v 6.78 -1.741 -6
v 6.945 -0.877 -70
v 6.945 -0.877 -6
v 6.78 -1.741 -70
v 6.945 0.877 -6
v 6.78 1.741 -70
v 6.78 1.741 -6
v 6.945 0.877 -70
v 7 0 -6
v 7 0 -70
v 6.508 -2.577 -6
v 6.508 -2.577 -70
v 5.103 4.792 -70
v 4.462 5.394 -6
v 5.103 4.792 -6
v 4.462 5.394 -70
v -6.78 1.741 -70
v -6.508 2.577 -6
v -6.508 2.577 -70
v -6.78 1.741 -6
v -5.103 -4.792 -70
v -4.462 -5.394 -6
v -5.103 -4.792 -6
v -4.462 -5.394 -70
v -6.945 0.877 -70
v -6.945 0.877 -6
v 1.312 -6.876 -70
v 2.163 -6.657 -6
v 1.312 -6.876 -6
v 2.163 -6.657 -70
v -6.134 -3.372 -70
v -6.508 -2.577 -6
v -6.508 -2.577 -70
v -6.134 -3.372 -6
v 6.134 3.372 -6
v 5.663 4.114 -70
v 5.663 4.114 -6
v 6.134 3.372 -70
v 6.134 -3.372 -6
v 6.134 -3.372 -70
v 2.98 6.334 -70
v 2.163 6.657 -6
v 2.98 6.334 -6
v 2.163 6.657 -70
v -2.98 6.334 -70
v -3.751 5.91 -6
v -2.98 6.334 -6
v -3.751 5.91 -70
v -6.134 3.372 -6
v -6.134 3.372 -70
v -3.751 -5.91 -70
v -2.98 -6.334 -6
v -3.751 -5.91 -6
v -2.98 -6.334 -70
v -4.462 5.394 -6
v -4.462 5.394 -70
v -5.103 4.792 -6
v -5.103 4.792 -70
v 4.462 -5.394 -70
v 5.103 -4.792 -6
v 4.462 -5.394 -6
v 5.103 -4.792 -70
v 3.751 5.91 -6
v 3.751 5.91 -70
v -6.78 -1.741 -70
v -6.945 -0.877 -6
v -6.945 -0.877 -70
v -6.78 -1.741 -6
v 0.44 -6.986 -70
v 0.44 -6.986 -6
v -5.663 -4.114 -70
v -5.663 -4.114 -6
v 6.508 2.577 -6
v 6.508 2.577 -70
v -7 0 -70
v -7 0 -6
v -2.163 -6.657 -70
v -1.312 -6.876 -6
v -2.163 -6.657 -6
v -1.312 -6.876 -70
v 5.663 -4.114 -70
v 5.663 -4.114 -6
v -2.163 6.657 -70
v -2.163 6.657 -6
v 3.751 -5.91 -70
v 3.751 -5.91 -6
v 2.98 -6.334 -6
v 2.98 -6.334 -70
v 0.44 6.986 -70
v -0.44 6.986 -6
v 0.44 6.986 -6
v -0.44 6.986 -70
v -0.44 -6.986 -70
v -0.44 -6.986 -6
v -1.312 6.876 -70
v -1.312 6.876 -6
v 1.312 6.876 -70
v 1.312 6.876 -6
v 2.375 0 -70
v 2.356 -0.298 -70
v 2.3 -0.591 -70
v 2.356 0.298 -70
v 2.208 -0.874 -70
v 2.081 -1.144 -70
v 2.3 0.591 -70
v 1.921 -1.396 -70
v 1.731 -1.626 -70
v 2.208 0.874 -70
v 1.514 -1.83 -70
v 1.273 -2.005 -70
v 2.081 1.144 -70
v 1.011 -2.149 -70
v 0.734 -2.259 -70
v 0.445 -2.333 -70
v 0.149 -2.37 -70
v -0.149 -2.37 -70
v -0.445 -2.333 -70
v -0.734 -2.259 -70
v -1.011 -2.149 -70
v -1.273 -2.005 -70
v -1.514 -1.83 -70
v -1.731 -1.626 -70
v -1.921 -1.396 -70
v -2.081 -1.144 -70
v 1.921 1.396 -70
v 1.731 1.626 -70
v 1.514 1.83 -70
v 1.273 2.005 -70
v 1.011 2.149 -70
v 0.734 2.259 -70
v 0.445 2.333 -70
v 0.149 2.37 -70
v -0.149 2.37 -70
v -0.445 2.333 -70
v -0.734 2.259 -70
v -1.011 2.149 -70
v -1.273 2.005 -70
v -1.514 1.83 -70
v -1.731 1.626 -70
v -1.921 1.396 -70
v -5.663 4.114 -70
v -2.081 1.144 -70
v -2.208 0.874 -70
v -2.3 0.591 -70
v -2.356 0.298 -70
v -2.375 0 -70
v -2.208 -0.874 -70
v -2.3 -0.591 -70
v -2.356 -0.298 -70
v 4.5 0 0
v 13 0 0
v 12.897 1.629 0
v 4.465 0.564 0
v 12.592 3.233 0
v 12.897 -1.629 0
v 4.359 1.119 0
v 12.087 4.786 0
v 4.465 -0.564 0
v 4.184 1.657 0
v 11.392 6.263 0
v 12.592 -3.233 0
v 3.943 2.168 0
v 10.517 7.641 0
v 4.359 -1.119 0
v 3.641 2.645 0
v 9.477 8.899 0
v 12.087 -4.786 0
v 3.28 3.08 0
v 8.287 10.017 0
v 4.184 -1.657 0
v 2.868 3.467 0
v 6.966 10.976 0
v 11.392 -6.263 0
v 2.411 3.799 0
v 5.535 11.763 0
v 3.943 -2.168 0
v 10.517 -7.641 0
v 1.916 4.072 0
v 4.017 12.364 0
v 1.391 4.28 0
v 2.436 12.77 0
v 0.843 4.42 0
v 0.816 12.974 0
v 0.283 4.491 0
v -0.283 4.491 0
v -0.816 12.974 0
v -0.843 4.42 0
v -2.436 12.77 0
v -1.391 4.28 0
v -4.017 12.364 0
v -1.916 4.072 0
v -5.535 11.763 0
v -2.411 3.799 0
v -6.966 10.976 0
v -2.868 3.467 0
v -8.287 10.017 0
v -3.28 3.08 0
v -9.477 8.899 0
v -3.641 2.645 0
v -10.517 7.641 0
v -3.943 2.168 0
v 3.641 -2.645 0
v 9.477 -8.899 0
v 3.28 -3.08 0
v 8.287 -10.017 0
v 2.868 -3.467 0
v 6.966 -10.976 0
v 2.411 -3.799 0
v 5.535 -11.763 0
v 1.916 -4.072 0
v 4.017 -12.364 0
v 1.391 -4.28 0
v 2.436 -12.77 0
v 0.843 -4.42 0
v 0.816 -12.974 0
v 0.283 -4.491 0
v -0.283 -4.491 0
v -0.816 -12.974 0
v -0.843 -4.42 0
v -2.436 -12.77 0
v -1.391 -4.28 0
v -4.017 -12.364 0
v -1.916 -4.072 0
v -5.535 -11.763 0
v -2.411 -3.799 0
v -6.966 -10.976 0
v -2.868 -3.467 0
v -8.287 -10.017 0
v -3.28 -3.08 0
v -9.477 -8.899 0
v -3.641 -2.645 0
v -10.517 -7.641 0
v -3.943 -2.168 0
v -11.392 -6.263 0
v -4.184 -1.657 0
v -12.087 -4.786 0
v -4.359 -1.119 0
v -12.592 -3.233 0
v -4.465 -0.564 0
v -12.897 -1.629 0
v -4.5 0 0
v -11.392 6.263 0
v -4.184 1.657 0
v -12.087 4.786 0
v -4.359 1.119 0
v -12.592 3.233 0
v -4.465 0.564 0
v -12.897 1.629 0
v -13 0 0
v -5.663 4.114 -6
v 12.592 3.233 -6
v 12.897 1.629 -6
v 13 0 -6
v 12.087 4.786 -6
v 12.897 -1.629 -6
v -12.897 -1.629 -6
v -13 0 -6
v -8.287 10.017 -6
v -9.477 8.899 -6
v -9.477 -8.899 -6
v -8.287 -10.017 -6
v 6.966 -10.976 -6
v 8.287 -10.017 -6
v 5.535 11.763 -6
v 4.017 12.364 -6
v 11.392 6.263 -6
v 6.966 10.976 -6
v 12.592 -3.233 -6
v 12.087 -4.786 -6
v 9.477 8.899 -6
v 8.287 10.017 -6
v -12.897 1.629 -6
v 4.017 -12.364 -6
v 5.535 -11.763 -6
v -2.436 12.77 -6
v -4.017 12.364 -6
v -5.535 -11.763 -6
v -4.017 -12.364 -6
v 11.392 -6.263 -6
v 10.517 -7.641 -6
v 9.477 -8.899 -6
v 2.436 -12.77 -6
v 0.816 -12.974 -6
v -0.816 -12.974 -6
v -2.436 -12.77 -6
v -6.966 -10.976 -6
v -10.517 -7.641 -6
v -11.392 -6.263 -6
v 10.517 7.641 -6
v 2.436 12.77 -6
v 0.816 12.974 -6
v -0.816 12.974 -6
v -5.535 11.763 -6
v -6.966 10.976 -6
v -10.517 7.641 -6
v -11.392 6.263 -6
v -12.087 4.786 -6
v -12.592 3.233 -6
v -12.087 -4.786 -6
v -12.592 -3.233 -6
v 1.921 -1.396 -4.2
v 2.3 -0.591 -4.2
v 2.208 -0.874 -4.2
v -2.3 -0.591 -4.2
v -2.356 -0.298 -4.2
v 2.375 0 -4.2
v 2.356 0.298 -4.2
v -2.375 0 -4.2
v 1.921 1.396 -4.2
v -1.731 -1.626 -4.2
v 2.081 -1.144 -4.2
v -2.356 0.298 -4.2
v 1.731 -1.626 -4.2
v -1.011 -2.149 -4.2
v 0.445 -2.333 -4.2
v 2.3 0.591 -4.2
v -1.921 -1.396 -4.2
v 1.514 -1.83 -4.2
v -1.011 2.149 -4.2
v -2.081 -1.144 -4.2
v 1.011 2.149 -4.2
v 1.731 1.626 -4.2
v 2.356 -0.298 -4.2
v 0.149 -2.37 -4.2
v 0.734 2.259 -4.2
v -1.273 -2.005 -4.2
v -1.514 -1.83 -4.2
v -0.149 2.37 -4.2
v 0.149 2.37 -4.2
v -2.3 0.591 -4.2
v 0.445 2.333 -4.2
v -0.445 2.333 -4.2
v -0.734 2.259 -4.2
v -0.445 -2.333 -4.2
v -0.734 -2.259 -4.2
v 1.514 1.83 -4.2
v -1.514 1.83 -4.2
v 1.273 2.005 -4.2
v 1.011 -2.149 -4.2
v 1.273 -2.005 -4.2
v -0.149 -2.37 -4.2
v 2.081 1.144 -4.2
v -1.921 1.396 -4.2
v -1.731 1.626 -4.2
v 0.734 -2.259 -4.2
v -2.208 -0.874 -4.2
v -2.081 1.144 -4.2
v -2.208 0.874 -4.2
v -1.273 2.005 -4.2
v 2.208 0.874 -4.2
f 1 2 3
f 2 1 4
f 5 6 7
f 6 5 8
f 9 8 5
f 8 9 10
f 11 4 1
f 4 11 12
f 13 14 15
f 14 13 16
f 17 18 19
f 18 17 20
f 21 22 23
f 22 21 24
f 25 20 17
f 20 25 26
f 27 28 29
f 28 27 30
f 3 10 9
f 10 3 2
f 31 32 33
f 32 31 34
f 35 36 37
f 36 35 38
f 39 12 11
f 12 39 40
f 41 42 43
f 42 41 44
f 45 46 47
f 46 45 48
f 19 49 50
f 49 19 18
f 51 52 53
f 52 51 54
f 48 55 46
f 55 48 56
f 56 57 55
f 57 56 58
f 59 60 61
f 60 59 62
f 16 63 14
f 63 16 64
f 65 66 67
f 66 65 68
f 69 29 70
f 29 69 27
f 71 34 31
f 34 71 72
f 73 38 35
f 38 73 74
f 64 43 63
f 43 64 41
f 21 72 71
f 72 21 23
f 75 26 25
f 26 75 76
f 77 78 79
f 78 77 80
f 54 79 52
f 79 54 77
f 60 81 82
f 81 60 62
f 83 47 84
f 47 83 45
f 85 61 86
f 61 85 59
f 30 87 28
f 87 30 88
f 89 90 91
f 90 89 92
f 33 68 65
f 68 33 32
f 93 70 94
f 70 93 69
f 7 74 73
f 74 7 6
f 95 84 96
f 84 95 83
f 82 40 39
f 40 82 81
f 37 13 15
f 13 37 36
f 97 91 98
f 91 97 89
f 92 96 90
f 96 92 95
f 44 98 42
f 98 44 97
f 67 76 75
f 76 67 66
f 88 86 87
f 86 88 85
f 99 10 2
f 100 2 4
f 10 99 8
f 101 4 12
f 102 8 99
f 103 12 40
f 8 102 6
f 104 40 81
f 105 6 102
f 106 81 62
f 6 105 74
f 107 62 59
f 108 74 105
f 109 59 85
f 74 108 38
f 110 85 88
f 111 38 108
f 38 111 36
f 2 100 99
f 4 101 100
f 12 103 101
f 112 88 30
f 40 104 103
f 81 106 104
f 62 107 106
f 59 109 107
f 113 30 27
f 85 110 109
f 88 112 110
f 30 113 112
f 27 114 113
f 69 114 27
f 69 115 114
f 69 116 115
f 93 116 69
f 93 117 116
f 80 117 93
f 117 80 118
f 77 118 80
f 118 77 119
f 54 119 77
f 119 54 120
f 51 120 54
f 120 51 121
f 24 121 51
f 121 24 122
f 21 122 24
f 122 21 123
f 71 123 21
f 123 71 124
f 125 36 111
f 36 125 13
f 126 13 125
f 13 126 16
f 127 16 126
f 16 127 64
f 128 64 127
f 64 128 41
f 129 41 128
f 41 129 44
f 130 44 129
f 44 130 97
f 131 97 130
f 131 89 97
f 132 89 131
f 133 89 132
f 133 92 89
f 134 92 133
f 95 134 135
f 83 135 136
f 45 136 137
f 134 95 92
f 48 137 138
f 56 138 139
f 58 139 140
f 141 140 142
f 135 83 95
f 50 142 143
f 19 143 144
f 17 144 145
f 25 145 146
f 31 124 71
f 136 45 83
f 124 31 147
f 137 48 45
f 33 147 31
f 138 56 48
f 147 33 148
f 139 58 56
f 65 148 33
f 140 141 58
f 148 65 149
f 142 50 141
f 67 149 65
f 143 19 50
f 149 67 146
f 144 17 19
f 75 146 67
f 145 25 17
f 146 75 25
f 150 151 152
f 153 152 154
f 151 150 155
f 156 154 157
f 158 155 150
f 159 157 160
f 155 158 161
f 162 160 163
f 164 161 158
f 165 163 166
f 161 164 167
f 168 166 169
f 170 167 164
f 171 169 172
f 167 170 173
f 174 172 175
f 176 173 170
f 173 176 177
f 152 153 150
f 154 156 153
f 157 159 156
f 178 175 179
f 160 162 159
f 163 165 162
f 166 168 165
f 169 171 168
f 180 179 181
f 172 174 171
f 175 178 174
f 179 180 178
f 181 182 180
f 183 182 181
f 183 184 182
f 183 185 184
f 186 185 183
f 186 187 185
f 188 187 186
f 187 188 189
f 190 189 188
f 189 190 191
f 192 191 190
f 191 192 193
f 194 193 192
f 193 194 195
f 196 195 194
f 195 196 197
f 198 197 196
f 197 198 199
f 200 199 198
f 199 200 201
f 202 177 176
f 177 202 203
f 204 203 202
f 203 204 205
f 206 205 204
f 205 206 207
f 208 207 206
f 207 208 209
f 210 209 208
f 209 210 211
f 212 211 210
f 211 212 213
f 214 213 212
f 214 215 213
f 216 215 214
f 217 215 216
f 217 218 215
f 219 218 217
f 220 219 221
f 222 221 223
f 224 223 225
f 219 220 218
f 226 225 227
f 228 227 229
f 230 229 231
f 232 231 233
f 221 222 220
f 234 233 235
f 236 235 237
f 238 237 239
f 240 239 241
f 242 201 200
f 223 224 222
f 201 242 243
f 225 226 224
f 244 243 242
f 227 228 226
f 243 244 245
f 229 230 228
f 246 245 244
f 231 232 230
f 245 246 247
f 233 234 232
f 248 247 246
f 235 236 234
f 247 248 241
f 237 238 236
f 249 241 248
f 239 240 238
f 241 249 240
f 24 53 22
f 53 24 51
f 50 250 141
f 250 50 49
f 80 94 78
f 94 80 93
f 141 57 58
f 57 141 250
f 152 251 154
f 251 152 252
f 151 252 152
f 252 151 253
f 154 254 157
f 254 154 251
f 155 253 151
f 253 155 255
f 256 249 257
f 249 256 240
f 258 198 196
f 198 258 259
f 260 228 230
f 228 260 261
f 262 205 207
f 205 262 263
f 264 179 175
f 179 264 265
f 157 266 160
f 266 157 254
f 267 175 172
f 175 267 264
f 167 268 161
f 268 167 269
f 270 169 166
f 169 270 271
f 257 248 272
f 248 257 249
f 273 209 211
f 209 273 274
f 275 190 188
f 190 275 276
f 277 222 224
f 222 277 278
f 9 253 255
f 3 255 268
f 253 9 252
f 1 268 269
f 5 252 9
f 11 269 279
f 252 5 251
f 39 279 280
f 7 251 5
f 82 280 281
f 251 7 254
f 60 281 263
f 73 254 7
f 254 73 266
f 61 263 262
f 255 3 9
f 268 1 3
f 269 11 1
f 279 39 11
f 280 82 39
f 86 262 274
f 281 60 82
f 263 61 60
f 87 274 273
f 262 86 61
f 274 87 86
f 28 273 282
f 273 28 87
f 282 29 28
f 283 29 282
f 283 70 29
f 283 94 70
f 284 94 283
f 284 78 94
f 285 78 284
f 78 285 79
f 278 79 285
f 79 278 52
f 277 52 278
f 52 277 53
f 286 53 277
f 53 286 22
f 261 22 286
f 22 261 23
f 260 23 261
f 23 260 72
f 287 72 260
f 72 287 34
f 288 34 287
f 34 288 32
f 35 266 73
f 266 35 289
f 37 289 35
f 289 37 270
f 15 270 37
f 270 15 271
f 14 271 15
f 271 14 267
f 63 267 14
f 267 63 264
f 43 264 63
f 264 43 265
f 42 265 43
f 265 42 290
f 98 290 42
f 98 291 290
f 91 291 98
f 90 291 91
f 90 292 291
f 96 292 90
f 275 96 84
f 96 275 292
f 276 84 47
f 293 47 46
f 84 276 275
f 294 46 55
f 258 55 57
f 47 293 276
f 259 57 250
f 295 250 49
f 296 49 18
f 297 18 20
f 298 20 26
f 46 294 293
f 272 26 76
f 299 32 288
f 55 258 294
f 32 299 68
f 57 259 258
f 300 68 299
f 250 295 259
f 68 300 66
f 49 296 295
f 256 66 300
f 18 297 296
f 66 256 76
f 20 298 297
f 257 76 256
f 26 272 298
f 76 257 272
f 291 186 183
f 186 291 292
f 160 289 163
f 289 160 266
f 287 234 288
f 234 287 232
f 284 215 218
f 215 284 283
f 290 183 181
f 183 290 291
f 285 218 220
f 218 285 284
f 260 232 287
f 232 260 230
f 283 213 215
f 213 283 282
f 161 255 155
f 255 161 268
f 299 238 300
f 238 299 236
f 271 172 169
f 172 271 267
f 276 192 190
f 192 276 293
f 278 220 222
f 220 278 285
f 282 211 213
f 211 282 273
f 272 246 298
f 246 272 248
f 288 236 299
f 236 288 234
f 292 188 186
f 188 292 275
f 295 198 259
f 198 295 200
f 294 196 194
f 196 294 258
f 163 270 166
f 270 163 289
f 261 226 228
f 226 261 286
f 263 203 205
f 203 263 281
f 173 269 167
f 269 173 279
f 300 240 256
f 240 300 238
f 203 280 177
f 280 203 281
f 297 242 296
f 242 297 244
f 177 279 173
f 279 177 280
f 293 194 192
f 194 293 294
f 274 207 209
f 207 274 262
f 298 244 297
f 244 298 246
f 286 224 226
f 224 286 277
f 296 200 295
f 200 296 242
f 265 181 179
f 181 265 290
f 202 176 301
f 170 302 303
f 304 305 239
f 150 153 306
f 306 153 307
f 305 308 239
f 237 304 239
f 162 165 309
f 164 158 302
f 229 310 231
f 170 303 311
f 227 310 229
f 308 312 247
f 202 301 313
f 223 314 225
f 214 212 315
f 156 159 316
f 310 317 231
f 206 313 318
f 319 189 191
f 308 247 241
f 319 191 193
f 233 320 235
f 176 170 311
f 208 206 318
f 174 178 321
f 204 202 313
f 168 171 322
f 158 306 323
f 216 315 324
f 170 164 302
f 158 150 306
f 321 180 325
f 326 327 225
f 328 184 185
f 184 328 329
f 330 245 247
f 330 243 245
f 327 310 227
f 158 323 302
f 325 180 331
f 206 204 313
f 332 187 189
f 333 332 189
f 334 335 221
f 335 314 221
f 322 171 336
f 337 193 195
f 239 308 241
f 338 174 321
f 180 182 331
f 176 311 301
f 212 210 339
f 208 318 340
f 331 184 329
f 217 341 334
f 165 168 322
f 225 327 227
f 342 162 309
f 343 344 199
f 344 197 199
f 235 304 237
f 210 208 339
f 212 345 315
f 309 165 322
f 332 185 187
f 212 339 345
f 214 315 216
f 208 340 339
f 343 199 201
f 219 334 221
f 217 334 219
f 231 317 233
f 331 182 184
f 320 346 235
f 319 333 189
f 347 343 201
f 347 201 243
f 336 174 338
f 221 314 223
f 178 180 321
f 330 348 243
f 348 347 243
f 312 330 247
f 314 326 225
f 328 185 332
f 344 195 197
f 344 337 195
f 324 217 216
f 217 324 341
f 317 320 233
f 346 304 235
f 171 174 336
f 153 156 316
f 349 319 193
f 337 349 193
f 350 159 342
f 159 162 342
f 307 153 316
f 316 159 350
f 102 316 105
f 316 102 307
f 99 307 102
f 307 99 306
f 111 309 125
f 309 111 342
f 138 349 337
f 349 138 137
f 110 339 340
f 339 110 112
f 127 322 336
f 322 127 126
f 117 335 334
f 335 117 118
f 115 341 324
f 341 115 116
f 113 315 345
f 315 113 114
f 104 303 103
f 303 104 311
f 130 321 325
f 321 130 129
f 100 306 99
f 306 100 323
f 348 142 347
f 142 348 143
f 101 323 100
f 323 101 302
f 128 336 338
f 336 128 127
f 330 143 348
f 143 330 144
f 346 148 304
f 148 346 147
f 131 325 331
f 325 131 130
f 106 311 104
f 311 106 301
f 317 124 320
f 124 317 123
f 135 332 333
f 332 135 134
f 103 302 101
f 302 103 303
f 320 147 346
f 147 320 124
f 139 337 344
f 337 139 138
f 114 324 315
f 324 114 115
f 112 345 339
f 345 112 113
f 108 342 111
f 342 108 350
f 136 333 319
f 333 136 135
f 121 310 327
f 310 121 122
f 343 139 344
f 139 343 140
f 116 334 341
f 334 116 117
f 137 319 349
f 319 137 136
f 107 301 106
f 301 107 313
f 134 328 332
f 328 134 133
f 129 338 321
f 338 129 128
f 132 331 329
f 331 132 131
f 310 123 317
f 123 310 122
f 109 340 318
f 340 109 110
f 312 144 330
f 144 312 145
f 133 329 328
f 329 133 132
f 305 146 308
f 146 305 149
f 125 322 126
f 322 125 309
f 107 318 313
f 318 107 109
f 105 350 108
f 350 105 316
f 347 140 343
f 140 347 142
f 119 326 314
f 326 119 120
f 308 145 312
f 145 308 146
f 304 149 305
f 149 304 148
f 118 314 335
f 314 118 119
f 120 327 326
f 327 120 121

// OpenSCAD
$fn = 50;


difference() {
	union() {
		translate(v = [0, 0, -70.0000000000]) {
			cylinder(h = 70, r = 7.0000000000);
		}
		translate(v = [0, 0, -6.0000000000]) {
			cylinder(h = 6, r = 13.0000000000);
		}
	}
	union() {
		translate(v = [0, 0, 0]) {
			rotate(a = [0, 0, 0]) {
				difference() {
					union() {
						#translate(v = [0, 0, -70.0000000000]) {
							cylinder(h = 70, r = 2.2500000000);
						}
						#translate(v = [0, 0, -4.2000000000]) {
							cylinder(h = 4.2000000000, r1 = 2.3750000000, r2 = 4.5000000000);
						}
						#translate(v = [0, 0, -70.0000000000]) {
							cylinder(h = 70, r = 2.3750000000);
						}
						#translate(v = [0, 0, -70.0000000000]) {
							cylinder(h = 70, r = 2.2500000000);
						}
					}
					union();
				}
			}
		}
	}
}
